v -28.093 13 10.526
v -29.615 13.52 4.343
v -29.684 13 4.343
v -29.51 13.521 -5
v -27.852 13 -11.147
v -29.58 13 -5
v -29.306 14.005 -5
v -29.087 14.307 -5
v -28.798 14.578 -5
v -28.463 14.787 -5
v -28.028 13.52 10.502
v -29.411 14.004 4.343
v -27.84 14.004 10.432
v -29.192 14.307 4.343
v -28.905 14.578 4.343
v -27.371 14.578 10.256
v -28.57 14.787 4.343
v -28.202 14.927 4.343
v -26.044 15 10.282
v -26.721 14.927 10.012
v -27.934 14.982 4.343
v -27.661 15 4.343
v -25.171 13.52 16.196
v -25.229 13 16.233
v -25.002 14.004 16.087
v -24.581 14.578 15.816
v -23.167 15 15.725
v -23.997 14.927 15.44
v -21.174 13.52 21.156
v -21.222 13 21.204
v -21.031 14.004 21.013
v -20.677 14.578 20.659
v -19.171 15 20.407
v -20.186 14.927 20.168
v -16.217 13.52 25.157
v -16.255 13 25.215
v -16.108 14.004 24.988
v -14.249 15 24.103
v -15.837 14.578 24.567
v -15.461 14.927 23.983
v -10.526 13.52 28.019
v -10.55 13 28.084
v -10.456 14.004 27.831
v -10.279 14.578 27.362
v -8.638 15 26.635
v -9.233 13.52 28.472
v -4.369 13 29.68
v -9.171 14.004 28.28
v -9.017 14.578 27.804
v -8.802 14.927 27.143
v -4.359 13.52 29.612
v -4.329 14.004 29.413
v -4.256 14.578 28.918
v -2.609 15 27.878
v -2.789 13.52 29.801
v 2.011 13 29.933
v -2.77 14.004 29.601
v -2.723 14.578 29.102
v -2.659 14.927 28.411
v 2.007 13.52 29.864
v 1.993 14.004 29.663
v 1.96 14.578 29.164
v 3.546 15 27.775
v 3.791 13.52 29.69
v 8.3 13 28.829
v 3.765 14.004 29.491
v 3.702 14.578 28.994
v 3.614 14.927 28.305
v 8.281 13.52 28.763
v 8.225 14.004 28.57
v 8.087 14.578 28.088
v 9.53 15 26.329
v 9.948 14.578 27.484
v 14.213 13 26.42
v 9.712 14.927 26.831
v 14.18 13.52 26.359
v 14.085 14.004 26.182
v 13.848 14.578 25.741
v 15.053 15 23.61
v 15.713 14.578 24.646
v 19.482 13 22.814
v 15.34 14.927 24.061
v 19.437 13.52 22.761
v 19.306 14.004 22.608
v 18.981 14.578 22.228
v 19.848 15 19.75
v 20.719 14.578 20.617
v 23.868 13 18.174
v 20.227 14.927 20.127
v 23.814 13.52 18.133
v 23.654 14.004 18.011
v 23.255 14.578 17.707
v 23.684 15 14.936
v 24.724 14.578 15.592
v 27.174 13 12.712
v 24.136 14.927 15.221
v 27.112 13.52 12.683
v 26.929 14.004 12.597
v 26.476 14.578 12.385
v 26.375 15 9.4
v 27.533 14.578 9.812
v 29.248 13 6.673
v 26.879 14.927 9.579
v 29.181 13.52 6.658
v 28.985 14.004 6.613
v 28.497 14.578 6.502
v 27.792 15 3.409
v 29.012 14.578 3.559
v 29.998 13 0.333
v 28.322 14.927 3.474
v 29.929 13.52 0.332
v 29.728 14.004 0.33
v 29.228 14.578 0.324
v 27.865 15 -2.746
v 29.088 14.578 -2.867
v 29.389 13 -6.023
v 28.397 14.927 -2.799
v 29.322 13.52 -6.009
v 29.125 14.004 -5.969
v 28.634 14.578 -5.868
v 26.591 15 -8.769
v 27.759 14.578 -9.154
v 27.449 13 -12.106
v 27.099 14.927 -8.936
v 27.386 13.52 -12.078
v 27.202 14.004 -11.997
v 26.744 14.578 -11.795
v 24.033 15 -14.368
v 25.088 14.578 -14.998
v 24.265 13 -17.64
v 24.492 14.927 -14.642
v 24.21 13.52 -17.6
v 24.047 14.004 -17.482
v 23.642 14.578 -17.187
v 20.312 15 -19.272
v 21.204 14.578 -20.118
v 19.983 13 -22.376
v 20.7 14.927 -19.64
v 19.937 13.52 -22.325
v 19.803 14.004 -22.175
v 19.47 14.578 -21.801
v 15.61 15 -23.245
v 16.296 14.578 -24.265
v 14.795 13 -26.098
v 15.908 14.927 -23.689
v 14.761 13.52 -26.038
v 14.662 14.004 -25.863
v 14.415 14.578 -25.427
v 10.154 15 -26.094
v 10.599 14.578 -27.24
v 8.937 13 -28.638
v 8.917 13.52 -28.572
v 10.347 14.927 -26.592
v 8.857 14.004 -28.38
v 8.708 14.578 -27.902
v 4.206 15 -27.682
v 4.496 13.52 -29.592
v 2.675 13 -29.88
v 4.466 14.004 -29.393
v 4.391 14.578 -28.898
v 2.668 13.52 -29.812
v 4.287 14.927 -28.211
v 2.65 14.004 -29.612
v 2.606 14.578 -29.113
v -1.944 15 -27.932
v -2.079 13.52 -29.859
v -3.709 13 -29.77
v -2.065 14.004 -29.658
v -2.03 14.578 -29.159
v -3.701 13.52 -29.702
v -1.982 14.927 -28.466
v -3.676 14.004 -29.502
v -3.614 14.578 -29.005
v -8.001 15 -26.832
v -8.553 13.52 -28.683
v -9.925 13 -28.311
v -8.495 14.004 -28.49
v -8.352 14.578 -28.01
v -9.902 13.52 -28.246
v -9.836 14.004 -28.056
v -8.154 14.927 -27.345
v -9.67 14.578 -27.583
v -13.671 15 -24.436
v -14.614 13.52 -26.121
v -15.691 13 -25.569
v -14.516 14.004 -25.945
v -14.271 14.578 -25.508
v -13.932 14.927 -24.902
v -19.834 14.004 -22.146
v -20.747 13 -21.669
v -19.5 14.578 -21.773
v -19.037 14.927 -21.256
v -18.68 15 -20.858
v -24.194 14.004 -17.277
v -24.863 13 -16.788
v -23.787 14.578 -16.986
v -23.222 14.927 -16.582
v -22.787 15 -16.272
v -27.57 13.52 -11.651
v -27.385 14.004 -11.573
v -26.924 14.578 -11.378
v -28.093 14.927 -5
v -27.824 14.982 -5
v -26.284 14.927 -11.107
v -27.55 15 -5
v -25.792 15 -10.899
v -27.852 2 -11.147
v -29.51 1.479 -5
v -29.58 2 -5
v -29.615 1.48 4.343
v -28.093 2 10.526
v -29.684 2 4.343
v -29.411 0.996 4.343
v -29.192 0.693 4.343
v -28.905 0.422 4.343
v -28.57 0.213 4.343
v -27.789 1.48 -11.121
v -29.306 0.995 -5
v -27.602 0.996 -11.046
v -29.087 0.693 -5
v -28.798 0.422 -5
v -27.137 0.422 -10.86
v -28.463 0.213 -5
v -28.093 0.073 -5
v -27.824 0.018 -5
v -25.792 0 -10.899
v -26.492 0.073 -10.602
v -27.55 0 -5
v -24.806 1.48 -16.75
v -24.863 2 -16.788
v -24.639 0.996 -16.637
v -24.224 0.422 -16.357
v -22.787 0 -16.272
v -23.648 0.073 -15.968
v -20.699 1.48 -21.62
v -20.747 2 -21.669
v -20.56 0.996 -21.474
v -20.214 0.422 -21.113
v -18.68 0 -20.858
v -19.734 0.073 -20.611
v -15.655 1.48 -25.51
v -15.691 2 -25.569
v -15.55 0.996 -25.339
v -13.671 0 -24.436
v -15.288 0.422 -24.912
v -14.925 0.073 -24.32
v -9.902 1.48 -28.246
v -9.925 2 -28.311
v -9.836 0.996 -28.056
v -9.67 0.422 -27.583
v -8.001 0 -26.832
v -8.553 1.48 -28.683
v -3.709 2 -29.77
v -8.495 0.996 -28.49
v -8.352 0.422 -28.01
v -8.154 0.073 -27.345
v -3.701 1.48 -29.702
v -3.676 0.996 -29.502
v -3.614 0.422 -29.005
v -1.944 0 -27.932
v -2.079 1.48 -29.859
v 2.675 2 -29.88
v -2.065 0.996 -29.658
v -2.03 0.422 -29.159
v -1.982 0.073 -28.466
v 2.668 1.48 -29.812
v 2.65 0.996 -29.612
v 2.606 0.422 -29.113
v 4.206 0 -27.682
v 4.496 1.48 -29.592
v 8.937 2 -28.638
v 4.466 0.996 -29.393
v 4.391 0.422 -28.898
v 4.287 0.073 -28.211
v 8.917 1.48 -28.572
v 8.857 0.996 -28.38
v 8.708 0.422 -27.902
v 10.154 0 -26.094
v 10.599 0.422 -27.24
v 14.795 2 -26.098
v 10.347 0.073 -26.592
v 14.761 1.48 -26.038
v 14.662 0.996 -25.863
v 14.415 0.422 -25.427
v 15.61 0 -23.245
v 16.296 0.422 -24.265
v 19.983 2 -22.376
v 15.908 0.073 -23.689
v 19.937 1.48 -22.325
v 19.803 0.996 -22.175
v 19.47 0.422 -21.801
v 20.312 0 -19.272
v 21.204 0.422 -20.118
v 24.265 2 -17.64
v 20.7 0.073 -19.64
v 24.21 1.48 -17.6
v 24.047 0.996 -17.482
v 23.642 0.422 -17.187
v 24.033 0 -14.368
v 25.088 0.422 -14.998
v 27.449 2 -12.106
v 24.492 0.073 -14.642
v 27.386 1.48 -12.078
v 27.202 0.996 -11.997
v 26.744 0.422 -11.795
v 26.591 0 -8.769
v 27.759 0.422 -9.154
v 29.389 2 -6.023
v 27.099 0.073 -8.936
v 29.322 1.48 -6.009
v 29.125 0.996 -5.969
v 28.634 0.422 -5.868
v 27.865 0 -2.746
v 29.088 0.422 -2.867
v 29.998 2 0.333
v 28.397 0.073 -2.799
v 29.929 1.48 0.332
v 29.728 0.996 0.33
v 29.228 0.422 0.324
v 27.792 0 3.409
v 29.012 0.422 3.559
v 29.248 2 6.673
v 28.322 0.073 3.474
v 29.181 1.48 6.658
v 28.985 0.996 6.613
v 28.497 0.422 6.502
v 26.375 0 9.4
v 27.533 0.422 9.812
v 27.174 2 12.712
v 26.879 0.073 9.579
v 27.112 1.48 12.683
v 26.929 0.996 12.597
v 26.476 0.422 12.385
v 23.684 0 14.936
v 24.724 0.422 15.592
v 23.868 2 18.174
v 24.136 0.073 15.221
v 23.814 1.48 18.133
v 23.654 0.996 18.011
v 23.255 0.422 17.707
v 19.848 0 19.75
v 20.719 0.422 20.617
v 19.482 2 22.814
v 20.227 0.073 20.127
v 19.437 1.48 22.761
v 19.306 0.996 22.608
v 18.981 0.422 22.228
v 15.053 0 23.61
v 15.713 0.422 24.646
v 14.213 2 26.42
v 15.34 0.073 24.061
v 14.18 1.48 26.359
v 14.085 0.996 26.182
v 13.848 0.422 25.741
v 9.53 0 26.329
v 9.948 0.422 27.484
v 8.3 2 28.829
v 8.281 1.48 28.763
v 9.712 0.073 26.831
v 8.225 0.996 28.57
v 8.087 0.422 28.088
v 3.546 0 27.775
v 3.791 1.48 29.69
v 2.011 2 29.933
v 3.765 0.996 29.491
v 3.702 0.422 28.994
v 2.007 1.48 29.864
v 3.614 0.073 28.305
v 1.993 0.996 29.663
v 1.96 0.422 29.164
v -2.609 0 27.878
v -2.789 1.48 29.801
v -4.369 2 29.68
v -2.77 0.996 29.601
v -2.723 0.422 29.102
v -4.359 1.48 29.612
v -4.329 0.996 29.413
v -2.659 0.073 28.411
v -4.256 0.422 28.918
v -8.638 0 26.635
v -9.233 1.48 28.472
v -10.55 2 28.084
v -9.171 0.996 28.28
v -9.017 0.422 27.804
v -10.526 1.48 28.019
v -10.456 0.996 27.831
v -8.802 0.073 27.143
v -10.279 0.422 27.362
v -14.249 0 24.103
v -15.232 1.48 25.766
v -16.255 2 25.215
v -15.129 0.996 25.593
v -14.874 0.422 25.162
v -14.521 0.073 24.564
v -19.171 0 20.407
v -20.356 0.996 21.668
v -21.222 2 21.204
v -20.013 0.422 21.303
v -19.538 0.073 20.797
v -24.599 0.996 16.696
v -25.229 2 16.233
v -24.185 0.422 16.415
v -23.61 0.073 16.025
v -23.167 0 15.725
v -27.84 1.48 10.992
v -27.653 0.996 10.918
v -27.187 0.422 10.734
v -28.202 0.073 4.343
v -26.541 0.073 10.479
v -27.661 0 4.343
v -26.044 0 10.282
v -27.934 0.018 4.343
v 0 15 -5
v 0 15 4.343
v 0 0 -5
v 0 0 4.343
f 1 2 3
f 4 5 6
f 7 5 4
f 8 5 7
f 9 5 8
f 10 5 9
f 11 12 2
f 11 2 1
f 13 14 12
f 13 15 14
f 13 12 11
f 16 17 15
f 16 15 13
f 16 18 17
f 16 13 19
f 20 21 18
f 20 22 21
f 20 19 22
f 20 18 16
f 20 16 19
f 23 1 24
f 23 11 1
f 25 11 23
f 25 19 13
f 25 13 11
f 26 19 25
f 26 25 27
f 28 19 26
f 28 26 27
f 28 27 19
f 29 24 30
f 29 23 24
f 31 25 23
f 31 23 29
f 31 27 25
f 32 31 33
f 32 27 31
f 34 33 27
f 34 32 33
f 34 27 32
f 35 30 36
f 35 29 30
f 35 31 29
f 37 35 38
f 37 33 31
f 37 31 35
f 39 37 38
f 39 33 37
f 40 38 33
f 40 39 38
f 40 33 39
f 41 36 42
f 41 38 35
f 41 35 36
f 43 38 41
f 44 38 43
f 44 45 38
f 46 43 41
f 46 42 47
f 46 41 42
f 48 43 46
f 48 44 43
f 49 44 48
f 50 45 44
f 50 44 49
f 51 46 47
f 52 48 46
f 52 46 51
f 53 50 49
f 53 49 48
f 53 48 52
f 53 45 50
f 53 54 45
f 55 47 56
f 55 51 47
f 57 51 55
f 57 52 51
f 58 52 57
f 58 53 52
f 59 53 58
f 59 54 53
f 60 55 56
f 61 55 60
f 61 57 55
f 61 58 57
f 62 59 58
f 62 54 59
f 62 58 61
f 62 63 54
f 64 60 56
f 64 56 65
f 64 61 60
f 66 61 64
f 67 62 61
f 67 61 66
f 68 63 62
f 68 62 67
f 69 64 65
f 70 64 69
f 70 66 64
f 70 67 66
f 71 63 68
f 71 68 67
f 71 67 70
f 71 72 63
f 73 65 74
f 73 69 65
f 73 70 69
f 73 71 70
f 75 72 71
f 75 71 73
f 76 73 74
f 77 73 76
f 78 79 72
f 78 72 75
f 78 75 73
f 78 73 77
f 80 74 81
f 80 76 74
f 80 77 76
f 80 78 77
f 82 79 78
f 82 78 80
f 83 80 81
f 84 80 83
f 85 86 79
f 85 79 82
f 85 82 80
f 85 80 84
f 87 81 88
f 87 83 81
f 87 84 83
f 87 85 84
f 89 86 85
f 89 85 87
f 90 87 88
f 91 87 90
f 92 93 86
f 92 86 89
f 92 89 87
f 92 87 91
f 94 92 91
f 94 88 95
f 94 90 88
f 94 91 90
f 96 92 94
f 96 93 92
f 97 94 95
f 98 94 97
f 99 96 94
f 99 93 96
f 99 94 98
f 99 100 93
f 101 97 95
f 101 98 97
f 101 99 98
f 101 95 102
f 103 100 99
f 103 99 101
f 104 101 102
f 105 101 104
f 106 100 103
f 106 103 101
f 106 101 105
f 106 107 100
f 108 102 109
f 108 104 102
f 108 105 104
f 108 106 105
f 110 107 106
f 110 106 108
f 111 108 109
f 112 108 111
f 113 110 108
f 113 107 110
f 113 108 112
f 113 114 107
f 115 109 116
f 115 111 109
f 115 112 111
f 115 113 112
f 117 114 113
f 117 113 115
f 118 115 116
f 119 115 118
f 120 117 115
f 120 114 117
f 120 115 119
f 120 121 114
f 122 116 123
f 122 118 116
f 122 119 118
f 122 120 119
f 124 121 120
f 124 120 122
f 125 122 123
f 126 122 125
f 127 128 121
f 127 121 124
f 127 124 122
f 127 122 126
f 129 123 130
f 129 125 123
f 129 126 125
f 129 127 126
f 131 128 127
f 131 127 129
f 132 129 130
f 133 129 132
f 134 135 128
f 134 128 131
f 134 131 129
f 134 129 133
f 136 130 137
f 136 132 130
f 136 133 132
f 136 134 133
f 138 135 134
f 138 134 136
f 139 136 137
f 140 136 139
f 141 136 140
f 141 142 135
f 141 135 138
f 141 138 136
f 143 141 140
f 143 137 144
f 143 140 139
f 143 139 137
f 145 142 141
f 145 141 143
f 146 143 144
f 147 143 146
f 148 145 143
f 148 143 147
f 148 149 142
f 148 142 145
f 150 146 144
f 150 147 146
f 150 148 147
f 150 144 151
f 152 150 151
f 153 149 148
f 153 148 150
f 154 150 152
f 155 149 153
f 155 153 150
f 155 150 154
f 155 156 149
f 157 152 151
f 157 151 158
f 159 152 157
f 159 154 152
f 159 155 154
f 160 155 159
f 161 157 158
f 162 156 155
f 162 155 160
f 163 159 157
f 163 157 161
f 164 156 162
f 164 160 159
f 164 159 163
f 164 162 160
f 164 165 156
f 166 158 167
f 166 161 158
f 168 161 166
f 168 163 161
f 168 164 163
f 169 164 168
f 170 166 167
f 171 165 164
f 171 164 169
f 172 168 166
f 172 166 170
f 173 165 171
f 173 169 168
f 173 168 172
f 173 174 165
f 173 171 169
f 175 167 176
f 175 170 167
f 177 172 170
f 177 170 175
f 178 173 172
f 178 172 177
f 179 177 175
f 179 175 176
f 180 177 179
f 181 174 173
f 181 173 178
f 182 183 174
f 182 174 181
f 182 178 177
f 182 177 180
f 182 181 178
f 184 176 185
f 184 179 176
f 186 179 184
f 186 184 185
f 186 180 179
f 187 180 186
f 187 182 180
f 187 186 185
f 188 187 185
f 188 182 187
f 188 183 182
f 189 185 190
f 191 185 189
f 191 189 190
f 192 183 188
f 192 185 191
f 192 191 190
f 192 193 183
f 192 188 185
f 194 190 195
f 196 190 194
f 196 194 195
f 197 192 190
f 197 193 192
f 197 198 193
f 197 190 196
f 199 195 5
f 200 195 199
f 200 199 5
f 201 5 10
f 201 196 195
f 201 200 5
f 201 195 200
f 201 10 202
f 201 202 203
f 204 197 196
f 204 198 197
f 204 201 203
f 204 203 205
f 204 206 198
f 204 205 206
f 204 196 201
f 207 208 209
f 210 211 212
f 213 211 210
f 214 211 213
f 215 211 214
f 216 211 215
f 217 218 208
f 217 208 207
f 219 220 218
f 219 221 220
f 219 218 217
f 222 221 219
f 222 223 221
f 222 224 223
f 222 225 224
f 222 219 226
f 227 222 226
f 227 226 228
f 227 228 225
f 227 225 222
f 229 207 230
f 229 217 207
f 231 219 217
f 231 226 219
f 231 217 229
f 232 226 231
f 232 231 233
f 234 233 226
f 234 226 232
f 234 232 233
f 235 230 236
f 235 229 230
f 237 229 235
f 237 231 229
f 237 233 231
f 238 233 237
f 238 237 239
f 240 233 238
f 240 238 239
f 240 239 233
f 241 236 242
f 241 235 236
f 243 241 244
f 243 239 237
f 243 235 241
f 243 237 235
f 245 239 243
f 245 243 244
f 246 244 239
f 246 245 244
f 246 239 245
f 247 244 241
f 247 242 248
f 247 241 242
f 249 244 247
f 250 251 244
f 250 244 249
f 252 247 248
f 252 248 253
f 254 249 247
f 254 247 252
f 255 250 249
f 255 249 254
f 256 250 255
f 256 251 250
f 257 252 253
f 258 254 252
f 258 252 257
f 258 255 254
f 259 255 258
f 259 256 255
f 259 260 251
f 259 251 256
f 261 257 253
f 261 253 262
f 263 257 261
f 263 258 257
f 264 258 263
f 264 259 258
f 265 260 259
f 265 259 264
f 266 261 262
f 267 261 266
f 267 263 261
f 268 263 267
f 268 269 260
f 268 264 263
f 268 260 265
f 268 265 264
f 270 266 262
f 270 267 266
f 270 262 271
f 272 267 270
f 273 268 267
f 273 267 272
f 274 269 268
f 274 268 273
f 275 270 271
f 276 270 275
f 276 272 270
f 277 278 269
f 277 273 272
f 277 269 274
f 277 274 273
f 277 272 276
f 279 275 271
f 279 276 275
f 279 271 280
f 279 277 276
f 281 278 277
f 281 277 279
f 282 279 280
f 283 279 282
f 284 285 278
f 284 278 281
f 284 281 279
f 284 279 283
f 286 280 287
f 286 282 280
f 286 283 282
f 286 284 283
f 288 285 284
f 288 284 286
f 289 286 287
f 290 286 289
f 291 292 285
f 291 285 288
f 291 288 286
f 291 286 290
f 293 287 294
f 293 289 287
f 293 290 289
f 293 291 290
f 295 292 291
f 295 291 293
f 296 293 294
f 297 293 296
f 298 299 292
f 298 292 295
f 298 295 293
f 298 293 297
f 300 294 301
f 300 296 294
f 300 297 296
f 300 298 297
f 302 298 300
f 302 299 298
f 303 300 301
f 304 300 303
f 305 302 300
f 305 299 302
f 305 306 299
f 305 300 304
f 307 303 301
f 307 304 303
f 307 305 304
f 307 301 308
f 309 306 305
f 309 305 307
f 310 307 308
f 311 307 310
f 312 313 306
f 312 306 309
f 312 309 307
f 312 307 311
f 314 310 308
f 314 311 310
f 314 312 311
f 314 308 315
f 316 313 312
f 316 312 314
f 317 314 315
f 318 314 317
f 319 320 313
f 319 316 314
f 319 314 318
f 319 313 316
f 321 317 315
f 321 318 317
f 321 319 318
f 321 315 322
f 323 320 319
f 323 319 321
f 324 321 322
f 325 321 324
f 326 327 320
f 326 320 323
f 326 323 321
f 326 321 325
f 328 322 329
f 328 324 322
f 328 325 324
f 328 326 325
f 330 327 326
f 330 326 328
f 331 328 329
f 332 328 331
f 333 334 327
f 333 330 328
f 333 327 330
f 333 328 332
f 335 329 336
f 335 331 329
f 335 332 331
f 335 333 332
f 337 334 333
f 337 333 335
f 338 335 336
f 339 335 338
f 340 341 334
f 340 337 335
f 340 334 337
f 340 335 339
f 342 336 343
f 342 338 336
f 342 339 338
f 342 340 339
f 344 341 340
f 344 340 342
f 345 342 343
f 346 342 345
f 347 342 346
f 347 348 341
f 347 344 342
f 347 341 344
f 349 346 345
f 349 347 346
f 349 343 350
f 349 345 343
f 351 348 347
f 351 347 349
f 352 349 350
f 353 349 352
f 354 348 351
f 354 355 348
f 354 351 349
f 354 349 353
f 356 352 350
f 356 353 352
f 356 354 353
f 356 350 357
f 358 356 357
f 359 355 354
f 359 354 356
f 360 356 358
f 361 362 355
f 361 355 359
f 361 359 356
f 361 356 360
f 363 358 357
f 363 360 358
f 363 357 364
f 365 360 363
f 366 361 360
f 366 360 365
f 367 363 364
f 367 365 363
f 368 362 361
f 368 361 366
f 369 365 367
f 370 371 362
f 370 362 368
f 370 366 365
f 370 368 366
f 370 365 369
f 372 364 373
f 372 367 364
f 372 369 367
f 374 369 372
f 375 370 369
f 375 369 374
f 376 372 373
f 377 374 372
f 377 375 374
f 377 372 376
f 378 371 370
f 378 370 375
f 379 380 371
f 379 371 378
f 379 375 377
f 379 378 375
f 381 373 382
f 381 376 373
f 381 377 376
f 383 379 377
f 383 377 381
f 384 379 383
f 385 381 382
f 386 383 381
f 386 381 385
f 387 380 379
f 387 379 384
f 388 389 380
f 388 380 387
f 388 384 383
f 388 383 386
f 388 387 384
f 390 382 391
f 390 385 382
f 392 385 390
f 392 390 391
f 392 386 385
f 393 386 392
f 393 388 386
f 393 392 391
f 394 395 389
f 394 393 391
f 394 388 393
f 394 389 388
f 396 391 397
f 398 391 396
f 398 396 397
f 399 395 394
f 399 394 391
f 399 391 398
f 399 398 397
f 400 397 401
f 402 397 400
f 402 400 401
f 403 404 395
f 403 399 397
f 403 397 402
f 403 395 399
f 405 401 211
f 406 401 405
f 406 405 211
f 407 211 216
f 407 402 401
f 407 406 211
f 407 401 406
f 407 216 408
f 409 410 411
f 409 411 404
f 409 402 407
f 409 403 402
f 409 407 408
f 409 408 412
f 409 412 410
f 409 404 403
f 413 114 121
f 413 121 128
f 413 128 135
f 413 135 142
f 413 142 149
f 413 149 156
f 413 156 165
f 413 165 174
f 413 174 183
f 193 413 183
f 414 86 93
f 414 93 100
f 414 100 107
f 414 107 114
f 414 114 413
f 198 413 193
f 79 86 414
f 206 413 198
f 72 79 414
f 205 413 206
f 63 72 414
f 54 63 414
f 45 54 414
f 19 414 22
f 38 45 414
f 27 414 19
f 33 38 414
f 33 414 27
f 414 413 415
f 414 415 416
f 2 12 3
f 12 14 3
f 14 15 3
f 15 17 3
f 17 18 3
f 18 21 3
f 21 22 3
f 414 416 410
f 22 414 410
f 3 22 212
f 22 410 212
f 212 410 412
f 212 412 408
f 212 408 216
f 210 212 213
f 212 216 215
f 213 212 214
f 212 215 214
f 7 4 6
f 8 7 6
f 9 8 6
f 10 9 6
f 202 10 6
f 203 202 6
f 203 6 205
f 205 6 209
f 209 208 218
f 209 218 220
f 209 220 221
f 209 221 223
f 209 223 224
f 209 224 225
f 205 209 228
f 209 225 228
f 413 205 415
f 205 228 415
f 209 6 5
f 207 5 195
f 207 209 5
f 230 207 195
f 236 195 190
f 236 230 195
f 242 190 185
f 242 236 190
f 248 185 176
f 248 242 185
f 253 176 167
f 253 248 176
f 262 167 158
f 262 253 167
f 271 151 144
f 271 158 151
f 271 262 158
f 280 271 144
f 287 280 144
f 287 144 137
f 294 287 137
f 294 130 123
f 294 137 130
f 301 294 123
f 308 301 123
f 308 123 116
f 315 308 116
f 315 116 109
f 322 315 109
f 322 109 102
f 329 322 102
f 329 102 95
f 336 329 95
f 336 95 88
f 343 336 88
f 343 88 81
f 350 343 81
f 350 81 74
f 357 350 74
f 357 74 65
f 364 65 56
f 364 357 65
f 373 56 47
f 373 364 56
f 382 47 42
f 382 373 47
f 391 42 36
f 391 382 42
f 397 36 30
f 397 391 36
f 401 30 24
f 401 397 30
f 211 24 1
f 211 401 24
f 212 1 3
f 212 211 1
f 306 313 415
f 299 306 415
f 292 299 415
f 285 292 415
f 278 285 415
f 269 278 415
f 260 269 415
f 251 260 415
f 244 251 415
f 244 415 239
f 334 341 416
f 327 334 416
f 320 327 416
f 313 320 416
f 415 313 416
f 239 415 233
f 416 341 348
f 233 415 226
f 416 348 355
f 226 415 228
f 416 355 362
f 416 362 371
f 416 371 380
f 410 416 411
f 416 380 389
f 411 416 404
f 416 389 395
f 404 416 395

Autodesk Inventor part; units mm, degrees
ref_plane "YZ Plane" through (0, 0, 0) normal (1, 0, 0) x (0, 1, 0)
ref_plane "XZ Plane" through (0, 0, 0) normal (0, 1, 0) x (-1, 0, 0)
ref_plane "XY Plane" through (0, 0, 0) normal (0, 0, 1) x (1, 0, 0)
sketch "Sketch1" plane through (0, 0, 0) normal (0, 1, 0) x (-1, 0, 0)
  arc A0 (29.684, 4.343) -> (29.5804, -5) centre (0, 0) ccw
  line L0 (29.5804, -5) -> (0, -5)
  line L1 (0, -5) -> (0, 4.343)
  line L2 (0, 4.343) -> (29.684, 4.343)
  dimension "d0" = 60
extrude "Extrusion1" add sketch "Sketch1" along normal blind 15
fillet "Fillet1" radius 2 2 edges at (29.9982, 15, 0.3325) (29.9982, 0, 0.3325)
properties part number "Hammer" material "Iron, Malleable"
